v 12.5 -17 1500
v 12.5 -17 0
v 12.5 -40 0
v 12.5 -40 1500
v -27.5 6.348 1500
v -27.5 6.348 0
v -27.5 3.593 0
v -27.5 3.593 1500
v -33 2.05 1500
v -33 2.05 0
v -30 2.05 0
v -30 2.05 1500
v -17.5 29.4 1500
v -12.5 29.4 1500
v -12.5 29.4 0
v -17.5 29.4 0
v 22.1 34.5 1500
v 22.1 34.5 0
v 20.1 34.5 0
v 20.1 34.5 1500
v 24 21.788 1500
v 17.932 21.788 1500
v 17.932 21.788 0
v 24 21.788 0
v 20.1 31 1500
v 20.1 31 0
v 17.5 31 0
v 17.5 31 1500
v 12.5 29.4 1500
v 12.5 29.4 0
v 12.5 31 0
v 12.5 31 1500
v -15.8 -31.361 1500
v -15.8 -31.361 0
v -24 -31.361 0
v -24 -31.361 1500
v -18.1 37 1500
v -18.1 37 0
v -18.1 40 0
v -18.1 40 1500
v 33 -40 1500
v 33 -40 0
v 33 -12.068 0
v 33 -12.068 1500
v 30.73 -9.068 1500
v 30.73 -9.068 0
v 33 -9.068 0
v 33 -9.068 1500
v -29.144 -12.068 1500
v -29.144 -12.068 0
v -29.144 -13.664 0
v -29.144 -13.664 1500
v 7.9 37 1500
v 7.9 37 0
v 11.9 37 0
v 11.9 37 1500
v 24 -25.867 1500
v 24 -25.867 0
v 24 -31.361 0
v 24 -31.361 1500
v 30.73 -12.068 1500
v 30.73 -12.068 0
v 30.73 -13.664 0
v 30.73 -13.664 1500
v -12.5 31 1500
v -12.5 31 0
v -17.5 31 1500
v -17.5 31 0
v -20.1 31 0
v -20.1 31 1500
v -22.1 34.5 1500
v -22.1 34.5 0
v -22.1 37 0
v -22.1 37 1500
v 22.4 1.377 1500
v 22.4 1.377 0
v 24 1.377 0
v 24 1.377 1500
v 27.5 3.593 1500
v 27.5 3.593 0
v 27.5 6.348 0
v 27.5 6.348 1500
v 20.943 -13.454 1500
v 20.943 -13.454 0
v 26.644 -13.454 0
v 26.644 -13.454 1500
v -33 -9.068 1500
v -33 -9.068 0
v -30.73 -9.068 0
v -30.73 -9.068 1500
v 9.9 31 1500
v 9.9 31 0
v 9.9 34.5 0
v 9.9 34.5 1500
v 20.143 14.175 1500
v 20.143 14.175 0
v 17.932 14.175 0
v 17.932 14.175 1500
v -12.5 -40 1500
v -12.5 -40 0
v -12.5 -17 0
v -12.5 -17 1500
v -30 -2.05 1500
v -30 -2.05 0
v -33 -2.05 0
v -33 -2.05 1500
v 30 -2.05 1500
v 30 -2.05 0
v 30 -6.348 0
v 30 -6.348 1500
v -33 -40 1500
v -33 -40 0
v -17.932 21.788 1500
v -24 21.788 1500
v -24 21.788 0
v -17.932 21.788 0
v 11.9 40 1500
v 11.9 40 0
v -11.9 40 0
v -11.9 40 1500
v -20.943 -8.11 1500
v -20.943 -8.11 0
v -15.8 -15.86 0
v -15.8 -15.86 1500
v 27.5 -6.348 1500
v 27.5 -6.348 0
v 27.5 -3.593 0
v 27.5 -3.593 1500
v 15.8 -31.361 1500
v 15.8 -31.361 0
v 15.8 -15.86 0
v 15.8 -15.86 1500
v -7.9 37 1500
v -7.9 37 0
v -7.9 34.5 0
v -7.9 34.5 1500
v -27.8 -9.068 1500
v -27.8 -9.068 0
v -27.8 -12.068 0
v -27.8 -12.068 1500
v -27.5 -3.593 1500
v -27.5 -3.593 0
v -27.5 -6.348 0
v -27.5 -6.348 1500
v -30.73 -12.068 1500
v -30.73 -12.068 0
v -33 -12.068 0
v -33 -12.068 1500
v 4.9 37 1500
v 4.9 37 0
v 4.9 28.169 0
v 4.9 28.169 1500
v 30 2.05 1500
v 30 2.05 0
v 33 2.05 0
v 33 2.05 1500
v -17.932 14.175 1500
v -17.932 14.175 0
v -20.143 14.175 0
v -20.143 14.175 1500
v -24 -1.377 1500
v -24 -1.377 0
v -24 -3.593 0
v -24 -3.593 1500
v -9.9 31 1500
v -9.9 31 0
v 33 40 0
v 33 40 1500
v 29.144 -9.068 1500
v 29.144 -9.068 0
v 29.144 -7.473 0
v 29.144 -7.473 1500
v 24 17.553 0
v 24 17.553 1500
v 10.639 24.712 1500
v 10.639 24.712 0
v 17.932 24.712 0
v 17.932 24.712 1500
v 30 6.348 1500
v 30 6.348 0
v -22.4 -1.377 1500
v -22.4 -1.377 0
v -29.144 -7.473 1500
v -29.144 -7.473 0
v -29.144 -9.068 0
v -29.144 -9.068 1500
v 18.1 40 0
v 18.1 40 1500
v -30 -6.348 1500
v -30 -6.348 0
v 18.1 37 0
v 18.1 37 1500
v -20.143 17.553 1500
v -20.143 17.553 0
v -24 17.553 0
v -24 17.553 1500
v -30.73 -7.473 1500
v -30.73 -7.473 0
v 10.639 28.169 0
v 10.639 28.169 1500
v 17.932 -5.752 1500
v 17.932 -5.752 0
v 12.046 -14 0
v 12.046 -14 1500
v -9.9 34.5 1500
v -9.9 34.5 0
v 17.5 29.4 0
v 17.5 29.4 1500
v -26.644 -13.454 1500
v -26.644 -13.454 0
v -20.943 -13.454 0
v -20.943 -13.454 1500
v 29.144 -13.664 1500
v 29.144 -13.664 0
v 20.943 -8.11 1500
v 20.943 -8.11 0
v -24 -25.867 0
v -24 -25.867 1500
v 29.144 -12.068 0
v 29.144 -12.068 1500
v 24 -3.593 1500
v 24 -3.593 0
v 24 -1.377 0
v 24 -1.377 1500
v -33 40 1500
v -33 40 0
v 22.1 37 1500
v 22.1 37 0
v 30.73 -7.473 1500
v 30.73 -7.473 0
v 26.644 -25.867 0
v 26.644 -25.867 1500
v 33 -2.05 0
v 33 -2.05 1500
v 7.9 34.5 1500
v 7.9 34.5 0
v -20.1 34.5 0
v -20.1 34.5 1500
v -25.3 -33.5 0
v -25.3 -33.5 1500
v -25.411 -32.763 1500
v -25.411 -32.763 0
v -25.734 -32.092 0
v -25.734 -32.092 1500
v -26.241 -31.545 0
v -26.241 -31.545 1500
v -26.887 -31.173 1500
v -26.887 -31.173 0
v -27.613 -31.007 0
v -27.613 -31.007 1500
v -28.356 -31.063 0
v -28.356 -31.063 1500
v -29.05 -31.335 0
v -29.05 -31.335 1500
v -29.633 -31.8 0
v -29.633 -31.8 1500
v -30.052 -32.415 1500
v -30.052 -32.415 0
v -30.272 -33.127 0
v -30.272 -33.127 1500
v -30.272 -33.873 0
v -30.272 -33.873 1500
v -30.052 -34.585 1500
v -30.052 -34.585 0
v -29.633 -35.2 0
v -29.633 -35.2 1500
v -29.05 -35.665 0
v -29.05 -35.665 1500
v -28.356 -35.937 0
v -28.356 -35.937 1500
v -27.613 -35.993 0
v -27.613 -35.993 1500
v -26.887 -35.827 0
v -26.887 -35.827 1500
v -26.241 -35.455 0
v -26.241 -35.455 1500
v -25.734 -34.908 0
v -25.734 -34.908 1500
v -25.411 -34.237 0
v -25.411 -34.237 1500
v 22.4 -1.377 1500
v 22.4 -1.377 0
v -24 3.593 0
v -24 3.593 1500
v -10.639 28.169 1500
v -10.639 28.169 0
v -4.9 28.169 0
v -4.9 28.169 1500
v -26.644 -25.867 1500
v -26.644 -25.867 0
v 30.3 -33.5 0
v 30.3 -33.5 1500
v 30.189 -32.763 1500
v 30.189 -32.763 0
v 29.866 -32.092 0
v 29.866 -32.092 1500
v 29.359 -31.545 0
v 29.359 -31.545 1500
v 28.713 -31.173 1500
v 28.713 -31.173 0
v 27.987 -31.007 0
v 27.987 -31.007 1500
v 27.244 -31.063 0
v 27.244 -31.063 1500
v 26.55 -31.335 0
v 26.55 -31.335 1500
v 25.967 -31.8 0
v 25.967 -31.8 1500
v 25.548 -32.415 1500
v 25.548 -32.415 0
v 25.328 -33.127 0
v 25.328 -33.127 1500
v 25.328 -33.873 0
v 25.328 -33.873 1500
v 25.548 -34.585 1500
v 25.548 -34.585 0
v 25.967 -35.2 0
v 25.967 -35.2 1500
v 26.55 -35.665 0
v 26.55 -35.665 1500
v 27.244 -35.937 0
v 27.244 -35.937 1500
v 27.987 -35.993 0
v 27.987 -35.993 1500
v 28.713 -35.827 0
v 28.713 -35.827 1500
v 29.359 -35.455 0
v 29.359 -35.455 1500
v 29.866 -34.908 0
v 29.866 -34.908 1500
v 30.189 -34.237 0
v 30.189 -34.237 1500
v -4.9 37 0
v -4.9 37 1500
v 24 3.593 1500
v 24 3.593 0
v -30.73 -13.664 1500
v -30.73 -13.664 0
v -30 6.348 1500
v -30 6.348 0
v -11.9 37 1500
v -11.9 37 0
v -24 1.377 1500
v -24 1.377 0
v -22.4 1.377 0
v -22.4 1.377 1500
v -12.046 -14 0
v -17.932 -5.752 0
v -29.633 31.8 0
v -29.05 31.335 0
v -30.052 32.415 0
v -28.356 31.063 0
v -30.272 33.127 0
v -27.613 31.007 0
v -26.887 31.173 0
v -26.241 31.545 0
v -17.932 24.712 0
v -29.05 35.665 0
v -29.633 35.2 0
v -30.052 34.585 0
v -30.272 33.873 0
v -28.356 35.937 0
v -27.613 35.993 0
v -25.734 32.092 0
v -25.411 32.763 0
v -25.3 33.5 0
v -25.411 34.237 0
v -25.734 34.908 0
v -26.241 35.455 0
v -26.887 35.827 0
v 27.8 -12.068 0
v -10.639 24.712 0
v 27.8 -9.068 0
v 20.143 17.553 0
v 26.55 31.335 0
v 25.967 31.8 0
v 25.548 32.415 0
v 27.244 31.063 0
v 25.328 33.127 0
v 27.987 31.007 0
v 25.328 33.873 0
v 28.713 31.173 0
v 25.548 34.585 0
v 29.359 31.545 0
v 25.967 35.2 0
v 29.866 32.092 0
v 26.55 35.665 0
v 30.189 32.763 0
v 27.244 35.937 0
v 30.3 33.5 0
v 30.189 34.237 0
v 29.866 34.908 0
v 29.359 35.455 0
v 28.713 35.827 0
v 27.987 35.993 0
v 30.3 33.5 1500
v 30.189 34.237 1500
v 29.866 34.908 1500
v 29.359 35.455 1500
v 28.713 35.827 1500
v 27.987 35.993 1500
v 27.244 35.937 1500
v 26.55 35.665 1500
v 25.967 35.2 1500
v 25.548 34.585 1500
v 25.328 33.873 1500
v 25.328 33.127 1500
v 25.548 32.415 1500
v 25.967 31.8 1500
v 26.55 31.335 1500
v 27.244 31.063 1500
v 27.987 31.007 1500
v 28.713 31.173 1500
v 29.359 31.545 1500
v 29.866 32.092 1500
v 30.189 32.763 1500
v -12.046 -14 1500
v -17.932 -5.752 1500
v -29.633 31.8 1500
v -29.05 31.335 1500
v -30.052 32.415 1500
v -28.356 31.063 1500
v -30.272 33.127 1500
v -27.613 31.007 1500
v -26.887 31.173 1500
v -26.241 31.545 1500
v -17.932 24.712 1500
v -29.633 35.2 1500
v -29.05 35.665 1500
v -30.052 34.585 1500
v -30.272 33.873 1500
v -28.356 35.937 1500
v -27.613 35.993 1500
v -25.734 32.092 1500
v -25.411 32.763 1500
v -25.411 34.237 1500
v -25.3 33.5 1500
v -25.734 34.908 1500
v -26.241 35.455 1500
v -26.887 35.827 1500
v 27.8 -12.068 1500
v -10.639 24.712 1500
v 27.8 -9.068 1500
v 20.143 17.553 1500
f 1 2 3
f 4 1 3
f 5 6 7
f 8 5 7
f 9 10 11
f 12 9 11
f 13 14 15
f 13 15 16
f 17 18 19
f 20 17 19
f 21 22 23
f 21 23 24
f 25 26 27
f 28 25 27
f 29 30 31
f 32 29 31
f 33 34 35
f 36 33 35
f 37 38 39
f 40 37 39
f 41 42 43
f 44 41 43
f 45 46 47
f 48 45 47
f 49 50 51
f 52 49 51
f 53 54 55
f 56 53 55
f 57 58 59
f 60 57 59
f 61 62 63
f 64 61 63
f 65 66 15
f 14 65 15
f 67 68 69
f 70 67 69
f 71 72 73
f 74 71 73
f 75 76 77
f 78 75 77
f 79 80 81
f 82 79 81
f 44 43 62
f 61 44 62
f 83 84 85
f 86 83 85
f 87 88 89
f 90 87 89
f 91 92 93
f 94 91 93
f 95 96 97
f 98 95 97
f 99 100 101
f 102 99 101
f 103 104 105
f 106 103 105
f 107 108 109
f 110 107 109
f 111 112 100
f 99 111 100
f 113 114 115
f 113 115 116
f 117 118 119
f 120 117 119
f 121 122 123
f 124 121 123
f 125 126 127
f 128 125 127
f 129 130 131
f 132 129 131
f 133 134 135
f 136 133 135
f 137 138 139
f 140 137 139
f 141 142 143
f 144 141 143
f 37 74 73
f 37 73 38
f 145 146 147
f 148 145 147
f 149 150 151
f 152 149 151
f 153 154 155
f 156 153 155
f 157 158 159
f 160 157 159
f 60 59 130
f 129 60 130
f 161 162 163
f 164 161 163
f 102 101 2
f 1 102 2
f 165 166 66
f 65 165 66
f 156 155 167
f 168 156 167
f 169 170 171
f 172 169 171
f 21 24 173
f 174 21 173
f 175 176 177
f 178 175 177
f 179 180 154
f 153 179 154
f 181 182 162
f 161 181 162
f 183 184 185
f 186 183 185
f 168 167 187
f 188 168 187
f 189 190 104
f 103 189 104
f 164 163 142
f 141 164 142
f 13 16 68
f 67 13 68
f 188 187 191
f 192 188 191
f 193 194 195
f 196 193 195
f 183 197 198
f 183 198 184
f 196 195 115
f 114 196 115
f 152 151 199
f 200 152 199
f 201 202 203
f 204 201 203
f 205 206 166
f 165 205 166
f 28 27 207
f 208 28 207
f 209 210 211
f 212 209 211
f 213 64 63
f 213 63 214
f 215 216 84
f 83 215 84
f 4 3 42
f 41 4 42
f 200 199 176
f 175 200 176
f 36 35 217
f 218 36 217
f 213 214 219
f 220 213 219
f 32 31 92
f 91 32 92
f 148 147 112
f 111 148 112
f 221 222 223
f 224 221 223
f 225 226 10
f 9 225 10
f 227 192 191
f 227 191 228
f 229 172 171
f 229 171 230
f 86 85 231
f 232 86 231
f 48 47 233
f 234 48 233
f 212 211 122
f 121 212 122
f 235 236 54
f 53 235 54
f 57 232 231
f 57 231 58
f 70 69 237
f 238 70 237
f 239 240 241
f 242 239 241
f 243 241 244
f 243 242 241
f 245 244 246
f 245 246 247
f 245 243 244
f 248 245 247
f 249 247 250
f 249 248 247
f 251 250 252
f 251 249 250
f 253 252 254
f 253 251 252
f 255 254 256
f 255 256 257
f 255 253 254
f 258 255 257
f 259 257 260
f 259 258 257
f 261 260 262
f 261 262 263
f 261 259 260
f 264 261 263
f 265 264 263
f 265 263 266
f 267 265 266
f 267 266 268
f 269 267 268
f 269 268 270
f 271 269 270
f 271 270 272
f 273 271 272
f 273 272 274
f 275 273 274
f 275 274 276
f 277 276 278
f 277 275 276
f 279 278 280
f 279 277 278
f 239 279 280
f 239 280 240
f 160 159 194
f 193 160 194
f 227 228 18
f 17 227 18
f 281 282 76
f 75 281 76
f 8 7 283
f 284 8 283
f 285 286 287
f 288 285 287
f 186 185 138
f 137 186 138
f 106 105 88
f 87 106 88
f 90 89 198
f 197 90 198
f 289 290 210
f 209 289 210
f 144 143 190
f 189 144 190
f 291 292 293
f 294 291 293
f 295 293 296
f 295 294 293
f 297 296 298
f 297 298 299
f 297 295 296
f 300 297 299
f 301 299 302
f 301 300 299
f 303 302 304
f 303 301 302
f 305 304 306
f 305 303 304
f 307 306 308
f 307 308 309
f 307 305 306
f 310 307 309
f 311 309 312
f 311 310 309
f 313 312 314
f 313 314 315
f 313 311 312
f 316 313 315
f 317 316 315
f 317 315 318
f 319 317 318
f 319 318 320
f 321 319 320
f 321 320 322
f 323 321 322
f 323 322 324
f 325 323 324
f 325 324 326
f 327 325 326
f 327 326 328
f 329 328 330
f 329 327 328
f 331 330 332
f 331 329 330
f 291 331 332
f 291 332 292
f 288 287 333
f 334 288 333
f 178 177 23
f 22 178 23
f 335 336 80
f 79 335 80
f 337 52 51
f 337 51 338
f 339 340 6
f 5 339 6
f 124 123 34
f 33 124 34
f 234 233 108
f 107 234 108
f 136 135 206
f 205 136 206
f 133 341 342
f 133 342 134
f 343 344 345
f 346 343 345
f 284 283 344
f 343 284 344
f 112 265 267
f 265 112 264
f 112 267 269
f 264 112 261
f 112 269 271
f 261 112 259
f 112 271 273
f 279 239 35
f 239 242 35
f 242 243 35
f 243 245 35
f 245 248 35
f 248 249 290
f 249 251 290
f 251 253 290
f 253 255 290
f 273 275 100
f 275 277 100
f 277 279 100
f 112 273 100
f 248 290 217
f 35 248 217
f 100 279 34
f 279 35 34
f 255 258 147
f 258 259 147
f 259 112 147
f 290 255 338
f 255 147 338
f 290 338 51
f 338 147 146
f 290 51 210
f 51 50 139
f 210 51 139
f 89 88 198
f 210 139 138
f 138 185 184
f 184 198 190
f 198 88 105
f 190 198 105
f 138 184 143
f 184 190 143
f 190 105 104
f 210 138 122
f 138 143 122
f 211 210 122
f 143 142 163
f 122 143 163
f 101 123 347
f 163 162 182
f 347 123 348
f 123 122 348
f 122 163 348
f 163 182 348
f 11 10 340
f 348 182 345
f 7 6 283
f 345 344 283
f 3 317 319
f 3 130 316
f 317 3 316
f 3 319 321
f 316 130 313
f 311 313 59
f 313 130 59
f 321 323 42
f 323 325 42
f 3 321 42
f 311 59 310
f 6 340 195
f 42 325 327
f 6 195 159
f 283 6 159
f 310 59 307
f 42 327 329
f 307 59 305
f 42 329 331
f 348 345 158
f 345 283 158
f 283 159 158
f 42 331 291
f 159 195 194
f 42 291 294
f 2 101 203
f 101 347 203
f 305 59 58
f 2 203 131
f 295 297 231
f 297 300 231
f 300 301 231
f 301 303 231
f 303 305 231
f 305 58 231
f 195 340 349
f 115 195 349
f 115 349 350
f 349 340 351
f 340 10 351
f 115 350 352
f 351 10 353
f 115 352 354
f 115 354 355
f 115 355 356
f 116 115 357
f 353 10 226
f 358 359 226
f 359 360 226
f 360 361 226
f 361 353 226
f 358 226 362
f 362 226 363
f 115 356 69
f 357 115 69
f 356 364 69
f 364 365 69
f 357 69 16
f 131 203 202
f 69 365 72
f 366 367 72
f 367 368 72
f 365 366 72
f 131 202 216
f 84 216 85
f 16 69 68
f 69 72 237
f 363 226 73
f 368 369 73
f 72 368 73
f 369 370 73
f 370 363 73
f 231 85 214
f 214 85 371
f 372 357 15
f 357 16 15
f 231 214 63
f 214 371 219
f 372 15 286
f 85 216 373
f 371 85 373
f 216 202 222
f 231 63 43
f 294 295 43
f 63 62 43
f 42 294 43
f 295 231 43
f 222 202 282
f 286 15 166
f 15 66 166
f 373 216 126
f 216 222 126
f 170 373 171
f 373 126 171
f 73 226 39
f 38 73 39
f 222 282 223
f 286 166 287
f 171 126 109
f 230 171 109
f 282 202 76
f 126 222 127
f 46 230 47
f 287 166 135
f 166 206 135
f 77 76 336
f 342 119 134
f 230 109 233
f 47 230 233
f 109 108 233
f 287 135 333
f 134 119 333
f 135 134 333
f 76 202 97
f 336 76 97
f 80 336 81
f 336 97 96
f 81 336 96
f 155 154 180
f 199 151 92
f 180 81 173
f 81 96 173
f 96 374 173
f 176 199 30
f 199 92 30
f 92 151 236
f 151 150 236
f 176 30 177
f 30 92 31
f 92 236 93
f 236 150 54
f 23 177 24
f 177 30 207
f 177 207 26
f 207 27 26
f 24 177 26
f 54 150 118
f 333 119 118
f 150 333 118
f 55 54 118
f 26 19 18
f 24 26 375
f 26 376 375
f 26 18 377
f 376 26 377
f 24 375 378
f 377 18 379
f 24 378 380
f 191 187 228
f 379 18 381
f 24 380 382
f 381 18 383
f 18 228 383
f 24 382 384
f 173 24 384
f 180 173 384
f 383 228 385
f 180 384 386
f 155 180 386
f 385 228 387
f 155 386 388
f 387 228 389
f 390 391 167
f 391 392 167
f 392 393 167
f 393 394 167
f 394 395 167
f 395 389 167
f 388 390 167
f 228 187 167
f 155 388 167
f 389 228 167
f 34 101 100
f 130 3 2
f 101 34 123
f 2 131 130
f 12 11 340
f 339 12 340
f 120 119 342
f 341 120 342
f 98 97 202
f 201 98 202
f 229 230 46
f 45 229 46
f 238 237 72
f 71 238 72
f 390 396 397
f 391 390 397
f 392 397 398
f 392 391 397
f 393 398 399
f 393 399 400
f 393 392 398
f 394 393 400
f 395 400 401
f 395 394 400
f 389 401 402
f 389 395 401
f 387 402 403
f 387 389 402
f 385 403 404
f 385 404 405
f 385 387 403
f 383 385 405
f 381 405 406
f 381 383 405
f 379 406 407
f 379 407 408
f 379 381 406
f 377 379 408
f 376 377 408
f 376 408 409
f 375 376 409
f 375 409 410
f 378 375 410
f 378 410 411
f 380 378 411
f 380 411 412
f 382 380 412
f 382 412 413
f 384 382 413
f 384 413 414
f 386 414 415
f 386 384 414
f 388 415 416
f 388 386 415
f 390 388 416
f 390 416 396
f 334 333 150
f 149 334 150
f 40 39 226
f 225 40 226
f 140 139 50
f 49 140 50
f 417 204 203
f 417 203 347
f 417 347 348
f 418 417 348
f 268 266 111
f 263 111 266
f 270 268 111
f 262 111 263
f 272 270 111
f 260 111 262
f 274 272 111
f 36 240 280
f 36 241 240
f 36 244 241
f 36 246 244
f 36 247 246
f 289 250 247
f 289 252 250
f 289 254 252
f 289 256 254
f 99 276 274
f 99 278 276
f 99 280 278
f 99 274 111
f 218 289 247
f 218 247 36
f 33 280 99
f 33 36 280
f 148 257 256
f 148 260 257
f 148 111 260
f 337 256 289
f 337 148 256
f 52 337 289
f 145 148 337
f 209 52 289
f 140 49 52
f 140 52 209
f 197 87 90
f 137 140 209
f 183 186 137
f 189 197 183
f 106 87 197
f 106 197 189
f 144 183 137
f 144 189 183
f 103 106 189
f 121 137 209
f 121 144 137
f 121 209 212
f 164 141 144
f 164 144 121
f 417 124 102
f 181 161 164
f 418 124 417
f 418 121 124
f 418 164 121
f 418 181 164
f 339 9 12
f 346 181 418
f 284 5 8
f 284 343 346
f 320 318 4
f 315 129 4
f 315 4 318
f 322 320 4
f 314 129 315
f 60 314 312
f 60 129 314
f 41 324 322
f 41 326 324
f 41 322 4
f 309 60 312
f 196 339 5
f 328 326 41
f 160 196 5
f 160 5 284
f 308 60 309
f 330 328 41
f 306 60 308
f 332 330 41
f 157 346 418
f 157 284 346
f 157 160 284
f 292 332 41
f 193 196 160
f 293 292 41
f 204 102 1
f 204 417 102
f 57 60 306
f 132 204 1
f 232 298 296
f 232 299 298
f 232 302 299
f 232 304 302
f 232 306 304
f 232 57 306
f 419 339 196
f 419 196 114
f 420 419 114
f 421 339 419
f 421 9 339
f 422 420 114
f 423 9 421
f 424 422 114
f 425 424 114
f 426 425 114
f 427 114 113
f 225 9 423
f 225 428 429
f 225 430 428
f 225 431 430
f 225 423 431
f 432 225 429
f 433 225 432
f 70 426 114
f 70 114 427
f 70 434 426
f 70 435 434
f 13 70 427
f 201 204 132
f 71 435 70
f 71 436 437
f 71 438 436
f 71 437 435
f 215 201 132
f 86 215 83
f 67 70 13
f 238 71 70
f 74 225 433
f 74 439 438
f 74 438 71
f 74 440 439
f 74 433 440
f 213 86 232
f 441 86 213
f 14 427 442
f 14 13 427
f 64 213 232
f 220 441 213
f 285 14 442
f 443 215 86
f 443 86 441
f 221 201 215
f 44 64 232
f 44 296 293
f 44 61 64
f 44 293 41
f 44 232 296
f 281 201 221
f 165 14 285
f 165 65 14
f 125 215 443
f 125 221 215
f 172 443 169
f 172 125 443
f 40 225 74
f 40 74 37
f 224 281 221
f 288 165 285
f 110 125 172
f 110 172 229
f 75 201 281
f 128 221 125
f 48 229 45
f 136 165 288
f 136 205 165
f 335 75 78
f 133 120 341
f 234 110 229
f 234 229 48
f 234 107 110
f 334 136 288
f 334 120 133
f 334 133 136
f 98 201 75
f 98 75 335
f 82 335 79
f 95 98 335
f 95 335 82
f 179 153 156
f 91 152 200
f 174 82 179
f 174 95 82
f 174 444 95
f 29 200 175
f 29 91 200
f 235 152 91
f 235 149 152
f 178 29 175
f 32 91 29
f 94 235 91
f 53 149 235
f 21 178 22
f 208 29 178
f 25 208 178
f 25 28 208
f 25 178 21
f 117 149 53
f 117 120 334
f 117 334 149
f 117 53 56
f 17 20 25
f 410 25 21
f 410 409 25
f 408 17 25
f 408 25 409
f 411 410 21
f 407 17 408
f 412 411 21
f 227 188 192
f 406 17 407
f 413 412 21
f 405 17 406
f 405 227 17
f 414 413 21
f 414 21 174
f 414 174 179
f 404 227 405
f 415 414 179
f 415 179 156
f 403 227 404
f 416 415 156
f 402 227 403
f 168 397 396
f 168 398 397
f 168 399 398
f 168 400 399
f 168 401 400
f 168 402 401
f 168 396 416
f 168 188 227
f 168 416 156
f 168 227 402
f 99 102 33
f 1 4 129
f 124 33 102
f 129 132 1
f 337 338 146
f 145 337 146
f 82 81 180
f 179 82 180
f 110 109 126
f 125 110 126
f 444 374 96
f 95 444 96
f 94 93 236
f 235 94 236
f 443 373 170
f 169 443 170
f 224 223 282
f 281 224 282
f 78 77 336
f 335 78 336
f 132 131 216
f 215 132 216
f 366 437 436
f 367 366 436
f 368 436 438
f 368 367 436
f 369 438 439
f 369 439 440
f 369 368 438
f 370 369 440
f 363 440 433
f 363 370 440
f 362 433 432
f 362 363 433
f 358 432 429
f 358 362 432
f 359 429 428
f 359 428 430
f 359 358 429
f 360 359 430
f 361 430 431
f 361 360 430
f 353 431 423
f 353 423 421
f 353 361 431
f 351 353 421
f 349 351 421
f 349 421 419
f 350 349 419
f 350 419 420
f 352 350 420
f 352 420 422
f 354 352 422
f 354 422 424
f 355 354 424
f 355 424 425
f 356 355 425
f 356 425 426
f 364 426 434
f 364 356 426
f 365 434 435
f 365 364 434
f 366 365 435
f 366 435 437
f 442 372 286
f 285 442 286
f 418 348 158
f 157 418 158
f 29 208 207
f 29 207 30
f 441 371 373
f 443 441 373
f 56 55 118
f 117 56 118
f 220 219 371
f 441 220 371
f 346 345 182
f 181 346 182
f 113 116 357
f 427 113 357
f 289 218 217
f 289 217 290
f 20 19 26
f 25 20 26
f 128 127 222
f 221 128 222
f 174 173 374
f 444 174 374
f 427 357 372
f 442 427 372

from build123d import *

# Parameters (mm, degrees)
SKETCH_2_R      = 2.5
EXTRUDE_1_DEPTH = 1500


with BuildPart() as part:
    # 草图2 → 凸台-拉伸1 (new body)
    with BuildSketch(Plane.XY):
        Polygon((-18.1, 37), (-18.1, 40), (-33, 40), (-33, 2.049564589), (-30, 2.049564589), (-30, 6.348214799), (-27.5, 6.348214799), (-27.5, 3.593219783), (-24, 3.593219783), (-24, 1.376590931), (-22.4, 1.376590931), (-22.4, -1.376590931), (-24, -1.376590931), (-24, -3.593219783), (-27.5, -3.593219783), (-27.5, -6.348214799), (-30, -6.348214799), (-30, -2.049564589), (-33, -2.049564589), (-33, -9.06837916), (-30.729793093, -9.06837916), (-30.729793093, -7.473013176), (-29.144133649, -7.473013176), (-29.144133649, -9.06837916), (-27.8, -9.06837916), (-27.8, -10.56837916), (-27.8, -12.06837916), (-29.144133649, -12.06837916), (-29.144133649, -13.663745144), (-30.729793093, -13.663745144), (-30.729793093, -12.06837916), (-33, -12.06837916), (-33, -40), (-12.5, -40), (-12.5, -17), (12.5, -17), (12.5, -40), (33, -40), (33, -12.06837916), (30.729793093, -12.06837916), (30.729793093, -13.663745144), (29.144133649, -13.663745144), (29.144133649, -12.06837916), (27.8, -12.06837916), (27.8, -10.56837916), (27.8, -9.06837916), (29.144133649, -9.06837916), (29.144133649, -7.473013176), (30.729793093, -7.473013176), (30.729793093, -9.06837916), (33, -9.06837916), (33, -2.049564589), (30, -2.049564589), (30, -6.348214799), (27.5, -6.348214799), (27.5, -3.593219783), (24, -3.593219783), (24, -1.376590931), (22.4, -1.376590931), (22.4, 1.376590931), (24, 1.376590931), (24, 3.593219783), (27.5, 3.593219783), (27.5, 6.348214799), (30, 6.348214799), (30, 2.049564589), (33, 2.049564589), (33, 40), (18.1, 40), (18.1, 37), (22.1, 37), (22.1, 34.5), (20.1, 34.5), (20.1, 31), (17.5, 31), (17.5, 29.4), (12.5, 29.4), (12.5, 31), (9.9, 31), (9.9, 34.5), (7.9, 34.5), (7.9, 37), (11.9, 37), (11.9, 40), (-11.9, 40), (-11.9, 37), (-7.9, 37), (-7.9, 34.5), (-9.9, 34.5), (-9.9, 31), (-12.5, 31), (-12.5, 29.4), (-17.5, 29.4), (-17.5, 31), (-20.1, 31), (-20.1, 34.5), (-22.1, 34.5), (-22.1, 37), align=None)
        with Locations((-27.8, -33.5)):
            Circle(SKETCH_2_R, mode=Mode.SUBTRACT)
        Polygon((-20.943121928, -13.45406673), (-20.943121928, -8.11004262), (-15.8, -15.86033199), (-15.8, -31.360910729), (-24, -31.360910729), (-24, -25.86703472), (-26.644243735, -25.86703472), (-26.644243735, -13.45406673), align=None, mode=Mode.SUBTRACT)
        with Locations((27.8, -33.5)):
            Circle(SKETCH_2_R, mode=Mode.SUBTRACT)
        Polygon((24, -25.86703472), (24, -31.360910729), (15.8, -31.360910729), (15.8, -15.86033199), (20.943121928, -8.11004262), (20.943121928, -13.45406673), (26.644243735, -13.45406673), (26.644243735, -25.86703472), align=None, mode=Mode.SUBTRACT)
        with Locations((-27.8, 33.5)):
            Circle(SKETCH_2_R, mode=Mode.SUBTRACT)
        Polygon((-24.000227571, 17.552802839), (-24.000227571, 21.788095294), (-17.932238887, 21.788095294), (-17.932238887, 24.712463894), (-10.638888278, 24.712463894), (-10.638888278, 28.169211595), (-4.9, 28.169211595), (-4.9, 37), (4.9, 37), (4.9, 28.169211595), (10.638888278, 28.169211595), (10.638888278, 24.712463894), (17.932238887, 24.712463894), (17.932238887, 21.788095294), (24.000227571, 21.788095294), (24.000227571, 17.552802839), (20.143121928, 17.552802839), (20.143121928, 14.174652905), (17.932238887, 14.174652905), (17.932238887, -5.752091446), (12.045824189, -14), (0, -14), (-12.045824189, -14), (-17.932238887, -5.752091446), (-17.932238887, 14.174652905), (-20.143121928, 14.174652905), (-20.143121928, 17.552802839), align=None, mode=Mode.SUBTRACT)
        with Locations((27.8, 33.5)):
            Circle(SKETCH_2_R, mode=Mode.SUBTRACT)
    extrude(amount=EXTRUDE_1_DEPTH)


solid = part.part
